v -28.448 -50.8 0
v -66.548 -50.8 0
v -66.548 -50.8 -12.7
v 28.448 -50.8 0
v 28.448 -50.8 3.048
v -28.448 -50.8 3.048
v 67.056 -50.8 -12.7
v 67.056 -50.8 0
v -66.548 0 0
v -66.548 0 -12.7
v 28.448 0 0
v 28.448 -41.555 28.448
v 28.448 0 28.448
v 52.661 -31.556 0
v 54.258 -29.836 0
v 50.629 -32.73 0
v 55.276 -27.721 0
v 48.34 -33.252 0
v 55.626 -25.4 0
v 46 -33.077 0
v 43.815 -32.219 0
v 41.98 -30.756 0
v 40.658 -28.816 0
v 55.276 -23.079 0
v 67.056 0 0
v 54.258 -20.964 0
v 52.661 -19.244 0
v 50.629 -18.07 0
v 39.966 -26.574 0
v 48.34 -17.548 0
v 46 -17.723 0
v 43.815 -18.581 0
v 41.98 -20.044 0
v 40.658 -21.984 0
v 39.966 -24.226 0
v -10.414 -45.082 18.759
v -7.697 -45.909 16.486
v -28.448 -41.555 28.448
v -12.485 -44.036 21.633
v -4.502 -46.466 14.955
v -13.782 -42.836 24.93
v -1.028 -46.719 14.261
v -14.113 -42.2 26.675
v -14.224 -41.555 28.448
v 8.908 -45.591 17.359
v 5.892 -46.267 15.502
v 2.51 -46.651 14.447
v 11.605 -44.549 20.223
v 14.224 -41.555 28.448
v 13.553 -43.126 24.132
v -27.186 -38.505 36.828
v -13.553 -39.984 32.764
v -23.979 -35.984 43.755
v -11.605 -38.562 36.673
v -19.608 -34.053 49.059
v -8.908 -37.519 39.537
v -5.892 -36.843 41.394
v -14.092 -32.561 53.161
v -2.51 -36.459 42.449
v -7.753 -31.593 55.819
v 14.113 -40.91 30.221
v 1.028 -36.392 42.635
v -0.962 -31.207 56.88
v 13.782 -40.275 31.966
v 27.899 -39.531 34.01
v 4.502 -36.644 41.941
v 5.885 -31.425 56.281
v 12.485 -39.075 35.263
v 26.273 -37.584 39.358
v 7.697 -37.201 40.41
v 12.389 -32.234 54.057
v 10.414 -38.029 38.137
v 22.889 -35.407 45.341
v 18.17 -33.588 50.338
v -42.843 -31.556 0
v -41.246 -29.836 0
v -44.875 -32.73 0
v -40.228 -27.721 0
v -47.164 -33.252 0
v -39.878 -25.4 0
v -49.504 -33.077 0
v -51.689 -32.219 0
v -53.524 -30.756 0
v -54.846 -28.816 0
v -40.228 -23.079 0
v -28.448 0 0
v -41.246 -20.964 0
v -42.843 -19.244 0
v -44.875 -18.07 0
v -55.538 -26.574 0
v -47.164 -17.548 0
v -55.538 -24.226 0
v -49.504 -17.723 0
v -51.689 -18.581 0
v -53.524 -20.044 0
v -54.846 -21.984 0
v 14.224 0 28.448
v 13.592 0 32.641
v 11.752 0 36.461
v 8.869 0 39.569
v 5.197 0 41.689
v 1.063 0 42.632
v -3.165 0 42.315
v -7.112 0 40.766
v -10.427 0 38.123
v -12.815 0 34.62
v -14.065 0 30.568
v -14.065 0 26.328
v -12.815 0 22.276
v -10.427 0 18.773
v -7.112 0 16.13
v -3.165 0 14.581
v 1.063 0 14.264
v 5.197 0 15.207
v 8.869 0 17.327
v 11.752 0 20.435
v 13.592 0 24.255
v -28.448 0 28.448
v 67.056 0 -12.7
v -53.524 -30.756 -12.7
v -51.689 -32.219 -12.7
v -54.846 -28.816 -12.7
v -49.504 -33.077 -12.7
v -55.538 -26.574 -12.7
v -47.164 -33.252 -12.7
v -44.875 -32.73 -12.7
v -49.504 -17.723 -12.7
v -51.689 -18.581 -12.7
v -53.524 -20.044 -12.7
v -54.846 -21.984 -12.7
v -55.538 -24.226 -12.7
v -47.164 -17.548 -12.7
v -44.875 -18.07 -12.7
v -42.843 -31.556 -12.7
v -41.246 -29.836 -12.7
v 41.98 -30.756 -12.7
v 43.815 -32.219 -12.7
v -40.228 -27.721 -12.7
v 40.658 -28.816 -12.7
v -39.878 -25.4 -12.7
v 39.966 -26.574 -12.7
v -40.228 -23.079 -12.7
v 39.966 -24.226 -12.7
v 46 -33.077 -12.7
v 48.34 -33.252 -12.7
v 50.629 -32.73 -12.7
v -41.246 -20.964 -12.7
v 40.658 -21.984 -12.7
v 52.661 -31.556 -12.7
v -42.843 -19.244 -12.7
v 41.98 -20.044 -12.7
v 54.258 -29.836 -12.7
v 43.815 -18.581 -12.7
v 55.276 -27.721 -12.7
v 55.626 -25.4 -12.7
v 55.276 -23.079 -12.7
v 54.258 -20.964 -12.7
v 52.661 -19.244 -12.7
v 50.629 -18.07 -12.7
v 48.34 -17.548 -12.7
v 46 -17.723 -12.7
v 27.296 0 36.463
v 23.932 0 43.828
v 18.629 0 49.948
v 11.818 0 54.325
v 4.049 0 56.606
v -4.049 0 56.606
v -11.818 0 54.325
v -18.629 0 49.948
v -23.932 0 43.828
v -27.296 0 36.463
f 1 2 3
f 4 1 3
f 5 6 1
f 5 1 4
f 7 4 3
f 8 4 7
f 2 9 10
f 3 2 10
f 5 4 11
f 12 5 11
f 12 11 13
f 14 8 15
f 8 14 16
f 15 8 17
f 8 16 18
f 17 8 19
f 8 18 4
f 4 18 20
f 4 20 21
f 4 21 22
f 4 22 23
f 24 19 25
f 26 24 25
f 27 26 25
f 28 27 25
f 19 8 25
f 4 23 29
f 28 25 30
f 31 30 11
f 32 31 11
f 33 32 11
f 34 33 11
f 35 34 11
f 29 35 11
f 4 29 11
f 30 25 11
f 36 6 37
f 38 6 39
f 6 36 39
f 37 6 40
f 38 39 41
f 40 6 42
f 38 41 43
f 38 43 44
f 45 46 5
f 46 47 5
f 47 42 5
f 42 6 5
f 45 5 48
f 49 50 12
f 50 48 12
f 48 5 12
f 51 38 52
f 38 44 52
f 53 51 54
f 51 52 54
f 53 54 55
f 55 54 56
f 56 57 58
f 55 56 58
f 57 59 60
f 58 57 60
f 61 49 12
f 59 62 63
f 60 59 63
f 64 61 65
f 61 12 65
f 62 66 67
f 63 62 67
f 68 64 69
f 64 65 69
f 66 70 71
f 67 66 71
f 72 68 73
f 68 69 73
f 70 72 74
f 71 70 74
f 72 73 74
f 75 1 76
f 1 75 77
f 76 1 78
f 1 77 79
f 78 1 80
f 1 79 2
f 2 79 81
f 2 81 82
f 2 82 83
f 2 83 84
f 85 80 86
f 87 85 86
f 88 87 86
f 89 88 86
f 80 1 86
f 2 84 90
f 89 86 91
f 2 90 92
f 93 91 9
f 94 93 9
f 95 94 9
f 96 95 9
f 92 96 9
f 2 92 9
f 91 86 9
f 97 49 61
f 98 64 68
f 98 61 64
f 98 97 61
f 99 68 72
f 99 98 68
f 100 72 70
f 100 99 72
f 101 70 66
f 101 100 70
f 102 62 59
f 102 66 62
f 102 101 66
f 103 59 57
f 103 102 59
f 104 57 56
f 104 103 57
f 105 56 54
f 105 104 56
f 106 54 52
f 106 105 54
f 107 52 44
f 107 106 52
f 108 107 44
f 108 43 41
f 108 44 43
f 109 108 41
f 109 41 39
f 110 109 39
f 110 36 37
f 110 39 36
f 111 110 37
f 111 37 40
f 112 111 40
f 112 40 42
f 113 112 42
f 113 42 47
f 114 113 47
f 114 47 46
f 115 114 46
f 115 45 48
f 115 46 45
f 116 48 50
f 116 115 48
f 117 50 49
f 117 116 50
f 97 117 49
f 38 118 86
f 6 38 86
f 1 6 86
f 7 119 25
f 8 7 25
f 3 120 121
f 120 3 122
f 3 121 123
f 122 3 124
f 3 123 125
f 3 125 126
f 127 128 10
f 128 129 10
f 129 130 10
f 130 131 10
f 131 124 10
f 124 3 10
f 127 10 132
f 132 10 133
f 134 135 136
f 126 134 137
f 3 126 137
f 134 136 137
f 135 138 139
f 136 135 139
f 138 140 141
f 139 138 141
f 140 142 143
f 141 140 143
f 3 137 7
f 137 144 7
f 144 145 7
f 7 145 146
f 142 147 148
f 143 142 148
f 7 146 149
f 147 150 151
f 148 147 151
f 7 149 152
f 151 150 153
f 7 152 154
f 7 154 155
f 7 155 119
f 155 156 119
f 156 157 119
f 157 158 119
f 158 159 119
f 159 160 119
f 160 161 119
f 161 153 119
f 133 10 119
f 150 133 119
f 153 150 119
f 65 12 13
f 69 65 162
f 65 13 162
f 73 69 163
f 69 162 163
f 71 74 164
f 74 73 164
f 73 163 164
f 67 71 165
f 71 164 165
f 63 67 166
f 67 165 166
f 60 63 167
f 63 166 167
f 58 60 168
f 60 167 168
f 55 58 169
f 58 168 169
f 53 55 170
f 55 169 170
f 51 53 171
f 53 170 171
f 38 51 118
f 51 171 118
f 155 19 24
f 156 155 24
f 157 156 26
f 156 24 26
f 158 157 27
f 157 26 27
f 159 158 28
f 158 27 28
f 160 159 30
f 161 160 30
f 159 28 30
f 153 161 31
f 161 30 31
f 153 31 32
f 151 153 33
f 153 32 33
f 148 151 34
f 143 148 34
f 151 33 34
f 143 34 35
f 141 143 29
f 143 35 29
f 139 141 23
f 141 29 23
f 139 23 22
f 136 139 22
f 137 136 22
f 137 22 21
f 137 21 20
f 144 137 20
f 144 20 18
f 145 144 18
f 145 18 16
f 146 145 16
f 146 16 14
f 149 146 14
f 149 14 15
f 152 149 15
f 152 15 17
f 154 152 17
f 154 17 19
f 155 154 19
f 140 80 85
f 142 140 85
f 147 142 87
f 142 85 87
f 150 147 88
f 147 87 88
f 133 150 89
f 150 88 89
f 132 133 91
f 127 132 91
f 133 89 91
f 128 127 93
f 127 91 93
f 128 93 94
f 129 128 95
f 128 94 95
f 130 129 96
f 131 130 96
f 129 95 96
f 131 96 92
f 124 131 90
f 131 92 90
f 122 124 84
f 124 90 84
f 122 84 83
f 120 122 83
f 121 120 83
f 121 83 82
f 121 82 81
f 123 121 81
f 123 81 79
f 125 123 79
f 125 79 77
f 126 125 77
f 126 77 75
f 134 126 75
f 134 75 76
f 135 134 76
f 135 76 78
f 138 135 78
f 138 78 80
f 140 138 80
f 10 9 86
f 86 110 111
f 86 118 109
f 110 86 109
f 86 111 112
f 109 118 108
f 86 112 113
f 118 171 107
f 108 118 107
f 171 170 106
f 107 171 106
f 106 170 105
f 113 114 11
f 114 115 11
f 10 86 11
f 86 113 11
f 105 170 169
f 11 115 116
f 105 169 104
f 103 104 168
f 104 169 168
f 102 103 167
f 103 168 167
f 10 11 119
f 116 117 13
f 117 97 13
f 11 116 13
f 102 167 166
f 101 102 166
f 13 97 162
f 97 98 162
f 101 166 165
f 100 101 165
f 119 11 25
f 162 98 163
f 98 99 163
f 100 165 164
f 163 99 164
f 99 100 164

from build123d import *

# Parameters (mm, degrees)
F0_R     = 14.224
F1_DEPTH = 50.8
F2_R     = 7.874
F3_DEPTH = 25.4
F5_DEPTH = 76.2


# Not quite as in the source:
# - a feature names something its author has since deleted; it is built from what else it names


with BuildPart() as f1:
    # F0 (on Front) → F1 (new body)
    with BuildSketch(Plane.XZ):
        with BuildLine():
            Line((28.448, 0), (28.448, 28.448))
            ThreePointArc((28.448, 28.448), (0, 56.896), (-28.448, 28.448))
            Line((-28.448, 28.448), (-28.448, 0))
            Line((-28.448, 0), (-66.548, 0))
            Line((-66.548, 0), (-66.548, -12.7))
            Line((-66.548, -12.7), (67.056, -12.7))
            Line((67.056, -12.7), (67.056, 0))
            Line((67.056, 0), (28.448, 0))
        make_face()
        with Locations((0, 28.448)):
            Circle(F0_R, mode=Mode.SUBTRACT)
    extrude(amount=F1_DEPTH)

    # F2 (on face) → F3 (cut)
    with BuildSketch(Plane.XY):
        with Locations((-47.752, -25.4)):
            Circle(F2_R)
        with Locations((47.752, -25.4)):
            Circle(F2_R)
    extrude(amount=-F3_DEPTH, mode=Mode.SUBTRACT)

    # F4 (on face) → F5 (cut)
    with BuildSketch(Plane.YZ.offset(28.448)):
        Polygon((-50.8, 28.448), (-50.8, 3.048), (-41.5551560496, 28.448), align=None)
        Polygon((-50.8, 28.448), (-41.5551560496, 28.448), (-26.8481459022, 68.8551782879), (-50.8, 64.0367791057), align=None)
    extrude(amount=-F5_DEPTH, mode=Mode.SUBTRACT)


solid = f1.part
